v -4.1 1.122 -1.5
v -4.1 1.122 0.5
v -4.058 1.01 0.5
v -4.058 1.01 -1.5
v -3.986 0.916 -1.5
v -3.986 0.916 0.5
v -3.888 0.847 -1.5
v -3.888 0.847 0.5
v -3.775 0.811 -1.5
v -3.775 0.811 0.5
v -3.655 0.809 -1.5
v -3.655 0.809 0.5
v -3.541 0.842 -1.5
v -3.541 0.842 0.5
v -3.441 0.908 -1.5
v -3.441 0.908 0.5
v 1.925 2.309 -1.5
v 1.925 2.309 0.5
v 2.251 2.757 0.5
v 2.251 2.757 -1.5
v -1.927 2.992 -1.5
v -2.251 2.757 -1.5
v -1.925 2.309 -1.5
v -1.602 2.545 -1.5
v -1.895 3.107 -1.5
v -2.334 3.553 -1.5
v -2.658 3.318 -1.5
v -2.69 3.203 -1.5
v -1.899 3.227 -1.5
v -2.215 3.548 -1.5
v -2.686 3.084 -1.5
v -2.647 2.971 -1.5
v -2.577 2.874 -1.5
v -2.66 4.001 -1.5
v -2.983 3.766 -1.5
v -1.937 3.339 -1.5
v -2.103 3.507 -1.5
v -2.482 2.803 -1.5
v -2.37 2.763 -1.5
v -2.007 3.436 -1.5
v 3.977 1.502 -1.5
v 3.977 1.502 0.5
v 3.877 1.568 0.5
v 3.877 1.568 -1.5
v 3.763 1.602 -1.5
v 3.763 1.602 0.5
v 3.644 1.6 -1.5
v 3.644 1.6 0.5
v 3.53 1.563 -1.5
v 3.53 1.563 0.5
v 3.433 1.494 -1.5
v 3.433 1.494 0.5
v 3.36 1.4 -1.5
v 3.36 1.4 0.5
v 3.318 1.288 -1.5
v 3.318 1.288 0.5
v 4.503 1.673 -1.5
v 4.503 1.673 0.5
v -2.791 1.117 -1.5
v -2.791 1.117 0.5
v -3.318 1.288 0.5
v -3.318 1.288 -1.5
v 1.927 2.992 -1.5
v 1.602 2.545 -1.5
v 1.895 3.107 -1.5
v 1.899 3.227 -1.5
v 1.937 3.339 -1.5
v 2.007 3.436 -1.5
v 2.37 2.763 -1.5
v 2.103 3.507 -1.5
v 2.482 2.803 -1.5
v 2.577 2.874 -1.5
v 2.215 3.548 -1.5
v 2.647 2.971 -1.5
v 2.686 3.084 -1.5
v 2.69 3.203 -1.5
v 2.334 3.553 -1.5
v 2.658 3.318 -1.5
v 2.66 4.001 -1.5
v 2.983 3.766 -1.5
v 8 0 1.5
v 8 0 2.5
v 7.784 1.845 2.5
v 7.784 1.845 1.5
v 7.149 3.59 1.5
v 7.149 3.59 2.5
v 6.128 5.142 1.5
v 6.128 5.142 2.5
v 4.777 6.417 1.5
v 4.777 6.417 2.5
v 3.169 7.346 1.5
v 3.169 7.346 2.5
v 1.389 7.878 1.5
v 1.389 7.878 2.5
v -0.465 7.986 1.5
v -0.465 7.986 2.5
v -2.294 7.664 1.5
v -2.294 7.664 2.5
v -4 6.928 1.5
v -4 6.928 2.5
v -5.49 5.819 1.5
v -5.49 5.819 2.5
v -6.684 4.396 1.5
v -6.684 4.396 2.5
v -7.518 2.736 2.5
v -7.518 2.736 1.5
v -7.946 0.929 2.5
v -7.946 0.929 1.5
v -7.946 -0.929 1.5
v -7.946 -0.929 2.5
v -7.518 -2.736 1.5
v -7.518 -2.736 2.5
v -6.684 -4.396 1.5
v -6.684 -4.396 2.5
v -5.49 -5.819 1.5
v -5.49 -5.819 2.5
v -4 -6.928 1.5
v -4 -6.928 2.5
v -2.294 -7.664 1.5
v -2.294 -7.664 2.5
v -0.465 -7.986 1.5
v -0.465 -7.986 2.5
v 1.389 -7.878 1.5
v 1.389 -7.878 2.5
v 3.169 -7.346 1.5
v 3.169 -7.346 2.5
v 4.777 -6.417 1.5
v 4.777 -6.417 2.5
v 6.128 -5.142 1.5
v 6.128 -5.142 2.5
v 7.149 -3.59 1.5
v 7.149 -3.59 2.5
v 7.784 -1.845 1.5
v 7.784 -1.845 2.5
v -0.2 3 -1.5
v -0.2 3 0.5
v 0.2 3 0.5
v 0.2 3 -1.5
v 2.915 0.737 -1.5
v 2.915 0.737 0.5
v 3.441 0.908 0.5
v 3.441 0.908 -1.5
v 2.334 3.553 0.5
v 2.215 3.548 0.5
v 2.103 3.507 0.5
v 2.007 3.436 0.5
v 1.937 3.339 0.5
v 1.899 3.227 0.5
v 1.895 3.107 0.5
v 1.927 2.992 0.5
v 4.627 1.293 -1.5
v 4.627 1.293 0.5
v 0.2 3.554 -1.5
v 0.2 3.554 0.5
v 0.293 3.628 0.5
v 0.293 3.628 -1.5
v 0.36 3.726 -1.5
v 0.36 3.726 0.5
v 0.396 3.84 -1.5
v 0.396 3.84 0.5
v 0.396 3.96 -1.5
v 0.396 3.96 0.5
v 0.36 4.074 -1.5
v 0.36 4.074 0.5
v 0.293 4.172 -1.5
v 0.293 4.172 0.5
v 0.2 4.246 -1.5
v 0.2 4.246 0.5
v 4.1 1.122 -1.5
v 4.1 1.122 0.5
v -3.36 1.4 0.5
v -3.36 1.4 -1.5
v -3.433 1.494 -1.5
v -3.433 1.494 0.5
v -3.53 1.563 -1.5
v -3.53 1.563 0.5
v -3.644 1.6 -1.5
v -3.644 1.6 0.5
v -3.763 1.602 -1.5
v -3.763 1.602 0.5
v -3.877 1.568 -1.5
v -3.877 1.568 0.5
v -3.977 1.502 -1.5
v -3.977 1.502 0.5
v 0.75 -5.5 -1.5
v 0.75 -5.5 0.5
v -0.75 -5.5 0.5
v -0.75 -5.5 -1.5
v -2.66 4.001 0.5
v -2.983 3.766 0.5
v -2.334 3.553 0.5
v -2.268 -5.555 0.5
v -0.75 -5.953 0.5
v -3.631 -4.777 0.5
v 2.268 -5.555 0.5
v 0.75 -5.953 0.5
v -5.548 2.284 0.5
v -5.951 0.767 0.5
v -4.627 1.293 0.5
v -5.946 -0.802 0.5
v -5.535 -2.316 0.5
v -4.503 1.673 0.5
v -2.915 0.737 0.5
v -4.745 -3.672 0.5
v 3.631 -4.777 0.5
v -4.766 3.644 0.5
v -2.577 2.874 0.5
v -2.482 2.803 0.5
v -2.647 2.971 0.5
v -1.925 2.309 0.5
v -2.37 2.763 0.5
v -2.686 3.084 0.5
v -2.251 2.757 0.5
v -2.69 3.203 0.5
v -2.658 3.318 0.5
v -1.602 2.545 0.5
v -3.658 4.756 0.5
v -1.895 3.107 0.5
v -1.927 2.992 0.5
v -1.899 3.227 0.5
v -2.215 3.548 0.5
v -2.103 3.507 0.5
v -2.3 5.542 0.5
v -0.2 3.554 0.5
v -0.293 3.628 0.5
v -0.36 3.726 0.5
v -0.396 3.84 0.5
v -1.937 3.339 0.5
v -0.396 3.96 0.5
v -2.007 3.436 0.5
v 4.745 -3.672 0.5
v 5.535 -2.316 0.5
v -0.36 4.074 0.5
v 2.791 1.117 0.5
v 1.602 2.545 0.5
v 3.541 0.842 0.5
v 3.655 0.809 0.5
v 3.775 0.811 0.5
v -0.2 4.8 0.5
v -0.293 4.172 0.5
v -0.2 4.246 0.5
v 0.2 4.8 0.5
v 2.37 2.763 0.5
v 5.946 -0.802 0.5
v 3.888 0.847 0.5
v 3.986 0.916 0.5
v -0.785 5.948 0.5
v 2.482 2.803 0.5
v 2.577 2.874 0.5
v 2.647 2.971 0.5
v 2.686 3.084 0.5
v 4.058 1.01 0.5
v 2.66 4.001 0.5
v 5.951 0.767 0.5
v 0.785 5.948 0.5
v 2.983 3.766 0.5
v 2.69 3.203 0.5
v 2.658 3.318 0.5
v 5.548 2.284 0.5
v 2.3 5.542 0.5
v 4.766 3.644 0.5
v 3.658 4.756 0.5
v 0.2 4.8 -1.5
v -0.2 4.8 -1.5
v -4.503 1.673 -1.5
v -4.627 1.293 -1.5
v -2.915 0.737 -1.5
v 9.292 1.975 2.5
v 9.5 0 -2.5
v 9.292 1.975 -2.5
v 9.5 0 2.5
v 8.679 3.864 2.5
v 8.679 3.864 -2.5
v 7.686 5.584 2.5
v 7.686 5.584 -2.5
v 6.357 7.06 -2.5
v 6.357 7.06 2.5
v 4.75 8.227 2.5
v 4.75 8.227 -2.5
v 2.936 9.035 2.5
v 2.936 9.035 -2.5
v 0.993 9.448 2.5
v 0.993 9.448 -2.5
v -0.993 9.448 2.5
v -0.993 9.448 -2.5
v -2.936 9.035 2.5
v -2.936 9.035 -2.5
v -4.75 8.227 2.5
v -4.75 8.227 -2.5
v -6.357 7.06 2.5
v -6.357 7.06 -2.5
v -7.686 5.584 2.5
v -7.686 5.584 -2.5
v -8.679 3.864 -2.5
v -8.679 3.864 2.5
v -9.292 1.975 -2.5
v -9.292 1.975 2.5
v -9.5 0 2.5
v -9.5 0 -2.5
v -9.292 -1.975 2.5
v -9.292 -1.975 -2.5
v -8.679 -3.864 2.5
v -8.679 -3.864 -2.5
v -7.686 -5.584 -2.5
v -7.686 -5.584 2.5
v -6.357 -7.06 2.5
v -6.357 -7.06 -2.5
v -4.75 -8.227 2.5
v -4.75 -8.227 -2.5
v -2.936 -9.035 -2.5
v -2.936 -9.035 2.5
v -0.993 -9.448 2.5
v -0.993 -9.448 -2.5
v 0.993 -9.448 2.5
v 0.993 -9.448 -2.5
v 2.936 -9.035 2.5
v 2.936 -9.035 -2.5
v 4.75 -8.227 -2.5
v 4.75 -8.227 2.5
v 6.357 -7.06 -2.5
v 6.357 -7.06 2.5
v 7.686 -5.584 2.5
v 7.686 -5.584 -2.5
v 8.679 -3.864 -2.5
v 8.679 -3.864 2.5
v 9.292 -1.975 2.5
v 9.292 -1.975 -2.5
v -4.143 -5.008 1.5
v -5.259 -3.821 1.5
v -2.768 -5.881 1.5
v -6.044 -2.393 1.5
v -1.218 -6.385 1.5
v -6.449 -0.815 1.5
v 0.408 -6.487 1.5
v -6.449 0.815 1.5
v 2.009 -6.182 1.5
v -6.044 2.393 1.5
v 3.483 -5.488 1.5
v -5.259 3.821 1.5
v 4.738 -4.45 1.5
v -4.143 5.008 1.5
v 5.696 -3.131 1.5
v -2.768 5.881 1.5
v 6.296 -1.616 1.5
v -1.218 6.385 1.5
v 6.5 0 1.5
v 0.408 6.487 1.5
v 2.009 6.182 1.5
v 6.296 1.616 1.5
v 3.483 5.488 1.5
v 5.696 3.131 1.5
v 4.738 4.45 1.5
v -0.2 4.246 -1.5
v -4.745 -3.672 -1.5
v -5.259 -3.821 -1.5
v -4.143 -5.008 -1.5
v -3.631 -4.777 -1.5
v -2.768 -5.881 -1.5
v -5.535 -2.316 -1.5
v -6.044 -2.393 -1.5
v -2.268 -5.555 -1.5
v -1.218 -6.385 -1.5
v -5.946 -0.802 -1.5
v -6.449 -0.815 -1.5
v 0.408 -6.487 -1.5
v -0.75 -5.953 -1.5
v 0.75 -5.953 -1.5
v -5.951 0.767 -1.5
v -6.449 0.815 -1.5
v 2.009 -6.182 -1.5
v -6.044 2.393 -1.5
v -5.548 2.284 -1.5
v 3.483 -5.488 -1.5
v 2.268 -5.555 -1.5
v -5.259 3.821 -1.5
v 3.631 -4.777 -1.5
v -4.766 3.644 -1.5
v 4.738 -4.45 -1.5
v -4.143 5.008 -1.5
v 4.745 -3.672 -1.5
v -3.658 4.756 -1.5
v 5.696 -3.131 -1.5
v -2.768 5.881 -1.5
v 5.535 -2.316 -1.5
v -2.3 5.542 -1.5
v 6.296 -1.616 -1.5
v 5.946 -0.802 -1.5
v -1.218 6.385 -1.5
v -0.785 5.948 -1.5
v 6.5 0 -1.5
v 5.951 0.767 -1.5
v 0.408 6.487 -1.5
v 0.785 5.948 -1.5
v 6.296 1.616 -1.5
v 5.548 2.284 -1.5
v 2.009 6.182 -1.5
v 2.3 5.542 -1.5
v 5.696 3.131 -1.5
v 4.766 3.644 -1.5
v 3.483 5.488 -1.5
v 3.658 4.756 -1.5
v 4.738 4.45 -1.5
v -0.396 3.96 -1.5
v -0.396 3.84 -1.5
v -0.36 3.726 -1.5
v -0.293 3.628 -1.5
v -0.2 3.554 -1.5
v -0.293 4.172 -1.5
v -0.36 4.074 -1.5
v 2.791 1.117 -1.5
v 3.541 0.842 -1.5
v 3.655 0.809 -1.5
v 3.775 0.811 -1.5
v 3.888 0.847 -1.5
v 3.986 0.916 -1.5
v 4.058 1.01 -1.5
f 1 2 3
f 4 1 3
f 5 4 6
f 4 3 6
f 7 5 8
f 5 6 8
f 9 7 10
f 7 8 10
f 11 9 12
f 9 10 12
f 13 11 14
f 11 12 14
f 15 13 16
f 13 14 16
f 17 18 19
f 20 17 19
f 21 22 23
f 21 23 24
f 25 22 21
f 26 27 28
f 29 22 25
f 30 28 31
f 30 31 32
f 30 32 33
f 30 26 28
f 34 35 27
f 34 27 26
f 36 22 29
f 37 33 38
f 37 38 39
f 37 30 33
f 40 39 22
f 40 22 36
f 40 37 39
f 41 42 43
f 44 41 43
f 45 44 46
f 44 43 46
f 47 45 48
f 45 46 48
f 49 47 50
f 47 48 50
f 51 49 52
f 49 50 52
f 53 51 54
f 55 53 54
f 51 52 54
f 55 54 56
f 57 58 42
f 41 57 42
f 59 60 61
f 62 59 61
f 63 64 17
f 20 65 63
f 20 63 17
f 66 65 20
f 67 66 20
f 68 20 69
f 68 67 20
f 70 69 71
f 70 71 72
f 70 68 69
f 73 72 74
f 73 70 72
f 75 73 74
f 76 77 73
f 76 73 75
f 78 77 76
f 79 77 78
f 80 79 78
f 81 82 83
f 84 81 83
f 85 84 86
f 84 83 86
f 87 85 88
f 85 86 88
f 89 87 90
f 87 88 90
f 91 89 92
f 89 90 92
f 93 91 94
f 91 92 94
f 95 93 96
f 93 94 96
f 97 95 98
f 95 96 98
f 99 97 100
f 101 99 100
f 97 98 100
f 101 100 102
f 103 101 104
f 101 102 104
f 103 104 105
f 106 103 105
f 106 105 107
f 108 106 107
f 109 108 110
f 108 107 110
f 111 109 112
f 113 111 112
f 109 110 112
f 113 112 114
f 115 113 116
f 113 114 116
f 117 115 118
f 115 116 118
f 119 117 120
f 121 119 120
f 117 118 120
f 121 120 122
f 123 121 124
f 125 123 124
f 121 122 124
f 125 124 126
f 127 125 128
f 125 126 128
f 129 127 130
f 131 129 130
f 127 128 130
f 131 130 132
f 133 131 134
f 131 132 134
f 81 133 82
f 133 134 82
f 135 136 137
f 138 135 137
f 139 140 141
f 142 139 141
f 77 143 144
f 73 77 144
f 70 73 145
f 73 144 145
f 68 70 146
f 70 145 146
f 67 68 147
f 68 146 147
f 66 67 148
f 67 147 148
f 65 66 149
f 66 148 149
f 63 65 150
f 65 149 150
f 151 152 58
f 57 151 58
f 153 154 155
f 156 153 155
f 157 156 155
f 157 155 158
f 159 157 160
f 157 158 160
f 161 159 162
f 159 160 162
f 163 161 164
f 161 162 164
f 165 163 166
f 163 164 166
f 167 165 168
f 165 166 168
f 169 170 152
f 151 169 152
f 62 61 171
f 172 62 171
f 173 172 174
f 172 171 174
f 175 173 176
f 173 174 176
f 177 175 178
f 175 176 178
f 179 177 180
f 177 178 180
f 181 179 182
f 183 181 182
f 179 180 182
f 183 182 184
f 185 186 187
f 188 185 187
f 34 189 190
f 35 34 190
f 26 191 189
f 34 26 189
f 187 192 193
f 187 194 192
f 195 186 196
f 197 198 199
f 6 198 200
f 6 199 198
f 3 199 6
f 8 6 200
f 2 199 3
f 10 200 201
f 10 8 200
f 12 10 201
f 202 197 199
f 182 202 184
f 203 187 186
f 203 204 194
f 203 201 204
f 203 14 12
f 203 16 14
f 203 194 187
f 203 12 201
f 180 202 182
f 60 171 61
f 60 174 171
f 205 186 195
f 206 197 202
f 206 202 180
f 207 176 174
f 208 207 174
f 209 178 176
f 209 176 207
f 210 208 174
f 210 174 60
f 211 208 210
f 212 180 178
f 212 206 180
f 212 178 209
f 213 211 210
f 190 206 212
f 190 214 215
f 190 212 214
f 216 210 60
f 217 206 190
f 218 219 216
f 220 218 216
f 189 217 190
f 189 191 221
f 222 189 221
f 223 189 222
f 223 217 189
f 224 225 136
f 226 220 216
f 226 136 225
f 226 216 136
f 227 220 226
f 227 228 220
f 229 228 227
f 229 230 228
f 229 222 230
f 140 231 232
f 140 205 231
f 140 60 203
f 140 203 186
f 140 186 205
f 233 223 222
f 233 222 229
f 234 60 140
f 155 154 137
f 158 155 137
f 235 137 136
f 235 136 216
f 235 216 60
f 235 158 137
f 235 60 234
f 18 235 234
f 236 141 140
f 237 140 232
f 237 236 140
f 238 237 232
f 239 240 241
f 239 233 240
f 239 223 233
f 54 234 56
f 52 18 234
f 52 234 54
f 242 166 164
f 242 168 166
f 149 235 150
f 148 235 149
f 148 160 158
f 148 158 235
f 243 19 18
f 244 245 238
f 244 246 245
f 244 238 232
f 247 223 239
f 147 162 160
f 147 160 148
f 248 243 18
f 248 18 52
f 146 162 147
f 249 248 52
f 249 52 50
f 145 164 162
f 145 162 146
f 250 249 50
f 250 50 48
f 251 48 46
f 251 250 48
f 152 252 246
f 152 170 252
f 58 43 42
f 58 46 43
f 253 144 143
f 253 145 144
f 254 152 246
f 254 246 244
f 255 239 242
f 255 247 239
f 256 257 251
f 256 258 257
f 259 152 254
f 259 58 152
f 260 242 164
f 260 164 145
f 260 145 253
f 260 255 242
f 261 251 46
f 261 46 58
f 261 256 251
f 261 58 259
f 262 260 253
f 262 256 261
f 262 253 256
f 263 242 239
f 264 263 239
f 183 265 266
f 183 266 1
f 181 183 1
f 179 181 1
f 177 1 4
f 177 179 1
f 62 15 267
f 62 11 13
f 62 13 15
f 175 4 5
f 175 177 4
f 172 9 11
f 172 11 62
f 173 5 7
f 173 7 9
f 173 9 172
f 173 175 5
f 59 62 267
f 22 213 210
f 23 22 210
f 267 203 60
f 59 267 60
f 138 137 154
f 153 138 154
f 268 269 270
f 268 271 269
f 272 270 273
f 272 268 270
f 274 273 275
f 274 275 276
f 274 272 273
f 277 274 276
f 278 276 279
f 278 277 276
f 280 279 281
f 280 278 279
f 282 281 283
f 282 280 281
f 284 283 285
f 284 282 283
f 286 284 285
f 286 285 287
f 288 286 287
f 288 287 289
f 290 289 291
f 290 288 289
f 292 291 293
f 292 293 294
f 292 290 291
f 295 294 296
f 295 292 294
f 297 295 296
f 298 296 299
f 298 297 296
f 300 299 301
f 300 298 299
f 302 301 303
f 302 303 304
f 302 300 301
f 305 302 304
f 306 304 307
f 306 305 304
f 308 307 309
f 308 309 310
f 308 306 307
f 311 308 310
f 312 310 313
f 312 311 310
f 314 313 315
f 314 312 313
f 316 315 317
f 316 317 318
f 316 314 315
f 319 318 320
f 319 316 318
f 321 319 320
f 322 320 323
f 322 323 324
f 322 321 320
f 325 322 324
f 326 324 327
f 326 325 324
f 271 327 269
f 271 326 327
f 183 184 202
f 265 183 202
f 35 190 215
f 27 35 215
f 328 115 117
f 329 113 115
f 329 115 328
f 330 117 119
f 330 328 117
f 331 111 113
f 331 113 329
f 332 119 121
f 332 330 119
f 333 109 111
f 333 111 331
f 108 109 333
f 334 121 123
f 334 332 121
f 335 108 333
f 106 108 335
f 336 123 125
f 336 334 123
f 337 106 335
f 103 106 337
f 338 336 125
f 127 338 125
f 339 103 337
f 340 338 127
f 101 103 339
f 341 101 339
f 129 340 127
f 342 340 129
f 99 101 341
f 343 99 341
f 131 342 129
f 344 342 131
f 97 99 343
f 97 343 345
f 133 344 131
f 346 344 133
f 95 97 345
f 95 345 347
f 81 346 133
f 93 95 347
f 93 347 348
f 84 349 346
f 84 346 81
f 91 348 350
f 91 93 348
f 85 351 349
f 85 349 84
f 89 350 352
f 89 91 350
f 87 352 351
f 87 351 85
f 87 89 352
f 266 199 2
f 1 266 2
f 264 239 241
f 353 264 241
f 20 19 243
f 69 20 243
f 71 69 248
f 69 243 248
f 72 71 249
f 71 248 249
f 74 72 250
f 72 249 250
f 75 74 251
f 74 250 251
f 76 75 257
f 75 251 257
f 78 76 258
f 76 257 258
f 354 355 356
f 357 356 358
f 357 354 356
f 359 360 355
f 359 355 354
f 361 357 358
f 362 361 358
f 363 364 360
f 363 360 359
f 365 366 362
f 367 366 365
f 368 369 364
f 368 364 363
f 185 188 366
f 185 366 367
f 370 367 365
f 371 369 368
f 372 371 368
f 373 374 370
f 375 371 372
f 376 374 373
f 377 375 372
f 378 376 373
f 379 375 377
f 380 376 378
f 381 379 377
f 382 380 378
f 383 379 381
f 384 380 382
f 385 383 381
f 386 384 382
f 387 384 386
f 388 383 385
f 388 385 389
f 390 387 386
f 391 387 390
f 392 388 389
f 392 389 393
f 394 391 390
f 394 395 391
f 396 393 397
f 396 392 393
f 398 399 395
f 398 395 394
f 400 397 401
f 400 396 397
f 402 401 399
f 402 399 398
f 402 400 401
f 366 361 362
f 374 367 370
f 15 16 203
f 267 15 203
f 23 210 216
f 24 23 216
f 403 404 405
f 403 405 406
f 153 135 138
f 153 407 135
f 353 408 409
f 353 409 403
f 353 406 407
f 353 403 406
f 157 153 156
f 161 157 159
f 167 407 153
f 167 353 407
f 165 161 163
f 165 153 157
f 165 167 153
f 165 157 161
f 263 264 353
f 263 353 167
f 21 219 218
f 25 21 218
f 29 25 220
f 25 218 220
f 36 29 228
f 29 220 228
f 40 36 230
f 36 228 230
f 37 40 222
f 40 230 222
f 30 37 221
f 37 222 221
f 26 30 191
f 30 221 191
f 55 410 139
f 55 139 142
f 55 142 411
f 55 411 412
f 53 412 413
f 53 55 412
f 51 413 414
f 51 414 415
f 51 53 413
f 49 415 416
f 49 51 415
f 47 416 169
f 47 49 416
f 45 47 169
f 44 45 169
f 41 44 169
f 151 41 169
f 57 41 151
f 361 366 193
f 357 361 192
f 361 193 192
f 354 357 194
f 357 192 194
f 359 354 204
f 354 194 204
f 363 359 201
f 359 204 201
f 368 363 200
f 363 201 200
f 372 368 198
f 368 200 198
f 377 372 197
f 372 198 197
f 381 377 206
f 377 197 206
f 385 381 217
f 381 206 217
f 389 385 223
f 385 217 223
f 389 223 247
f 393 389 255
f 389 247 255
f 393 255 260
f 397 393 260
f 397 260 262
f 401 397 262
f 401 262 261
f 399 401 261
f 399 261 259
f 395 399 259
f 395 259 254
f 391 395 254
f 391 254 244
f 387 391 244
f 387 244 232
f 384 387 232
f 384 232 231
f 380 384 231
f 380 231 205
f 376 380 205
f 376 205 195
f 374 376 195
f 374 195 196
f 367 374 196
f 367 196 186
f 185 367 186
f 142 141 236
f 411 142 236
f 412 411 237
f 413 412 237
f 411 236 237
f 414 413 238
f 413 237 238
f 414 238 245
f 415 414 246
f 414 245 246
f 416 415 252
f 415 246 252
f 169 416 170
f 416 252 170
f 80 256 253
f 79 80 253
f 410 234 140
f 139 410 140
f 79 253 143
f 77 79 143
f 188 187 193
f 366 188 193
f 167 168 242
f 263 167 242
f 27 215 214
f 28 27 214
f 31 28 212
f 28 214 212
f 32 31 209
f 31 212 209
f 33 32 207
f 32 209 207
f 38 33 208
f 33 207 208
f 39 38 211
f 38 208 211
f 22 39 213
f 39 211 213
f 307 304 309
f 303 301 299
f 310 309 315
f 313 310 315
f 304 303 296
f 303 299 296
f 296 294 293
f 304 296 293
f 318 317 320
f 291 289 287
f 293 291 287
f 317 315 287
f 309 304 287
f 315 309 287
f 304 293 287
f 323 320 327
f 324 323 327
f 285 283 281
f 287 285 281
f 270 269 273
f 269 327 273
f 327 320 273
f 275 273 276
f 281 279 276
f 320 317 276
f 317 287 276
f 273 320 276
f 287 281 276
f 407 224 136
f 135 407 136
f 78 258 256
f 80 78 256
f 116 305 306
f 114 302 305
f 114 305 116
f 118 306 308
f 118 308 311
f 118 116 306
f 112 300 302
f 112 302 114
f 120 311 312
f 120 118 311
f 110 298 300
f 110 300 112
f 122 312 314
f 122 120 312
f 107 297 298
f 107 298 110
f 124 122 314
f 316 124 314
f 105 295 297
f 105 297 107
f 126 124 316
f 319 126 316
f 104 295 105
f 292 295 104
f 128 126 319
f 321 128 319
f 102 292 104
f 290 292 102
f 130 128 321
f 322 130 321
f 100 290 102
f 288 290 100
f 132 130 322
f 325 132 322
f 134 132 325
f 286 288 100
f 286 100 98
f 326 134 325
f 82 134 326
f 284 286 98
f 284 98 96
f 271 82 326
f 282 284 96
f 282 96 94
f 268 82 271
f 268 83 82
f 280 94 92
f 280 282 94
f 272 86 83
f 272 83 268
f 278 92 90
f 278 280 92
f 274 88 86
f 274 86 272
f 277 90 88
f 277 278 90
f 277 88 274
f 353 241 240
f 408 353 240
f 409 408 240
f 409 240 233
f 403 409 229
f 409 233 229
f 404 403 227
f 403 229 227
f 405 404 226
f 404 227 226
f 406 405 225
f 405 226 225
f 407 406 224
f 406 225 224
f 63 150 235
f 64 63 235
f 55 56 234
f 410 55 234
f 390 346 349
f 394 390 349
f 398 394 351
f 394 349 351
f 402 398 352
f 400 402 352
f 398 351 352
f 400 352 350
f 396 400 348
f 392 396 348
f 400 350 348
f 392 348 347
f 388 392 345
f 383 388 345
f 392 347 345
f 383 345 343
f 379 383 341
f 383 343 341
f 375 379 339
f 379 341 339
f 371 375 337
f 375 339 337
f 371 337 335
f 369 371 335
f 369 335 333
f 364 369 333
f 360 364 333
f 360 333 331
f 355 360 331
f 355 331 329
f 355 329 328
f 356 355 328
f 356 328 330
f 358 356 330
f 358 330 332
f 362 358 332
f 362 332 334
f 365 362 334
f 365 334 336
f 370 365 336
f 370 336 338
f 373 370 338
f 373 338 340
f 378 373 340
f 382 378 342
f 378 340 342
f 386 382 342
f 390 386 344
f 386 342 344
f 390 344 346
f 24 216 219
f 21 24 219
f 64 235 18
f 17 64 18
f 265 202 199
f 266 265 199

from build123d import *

# Parameters (mm, degrees)
F0_R     = 9.5
F1_DEPTH = 2.5
F2_R     = 6.5
F3_DEPTH = 4
F4_R     = 6
F5_DEPTH = 2
F6_R     = 8
F7_DEPTH = 1


with BuildPart() as f1:
    # F0 (on Top) → F1 (new body, symmetric)
    with BuildSketch(Plane.XY):
        Circle(F0_R)
    extrude(amount=F1_DEPTH, both=True)

    # F2 (on face) → F3 (cut)
    with BuildSketch(Plane.XY.offset(2.5)):
        Circle(F2_R)
        with BuildLine():
            ThreePointArc((-0.75, -5.95294), (0, 6), (0.75, -5.95294))
            Line((0.75, -5.95294), (0.75, -5.5))
            Line((0.75, -5.5), (-0.75, -5.5))
            Line((-0.75, -5.5), (-0.75, -5.95294))
        make_face(mode=Mode.SUBTRACT)
        with BuildLine():
            Line((-3.441468, 0.907908), (-2.914973, 0.73684))
            Line((-2.914973, 0.73684), (-2.791366, 1.117262))
            Line((-2.791366, 1.117262), (-3.317861, 1.288331))
            ThreePointArc((-3.317861, 1.288331), (-3.585514, 1.585589), (-3.976773, 1.502424))
            Line((-3.976773, 1.502424), (-4.503268, 1.673493))
            Line((-4.503268, 1.673493), (-4.626875, 1.29307))
            Line((-4.626875, 1.29307), (-4.100379, 1.122002))
            ThreePointArc((-4.100379, 1.122002), (-3.832727, 0.824744), (-3.441468, 0.907908))
        make_face()
        with BuildLine():
            Line((-2.250551, 2.757358), (-1.925159, 2.309494))
            Line((-1.925159, 2.309494), (-1.601552, 2.544608))
            Line((-1.601552, 2.544608), (-1.926944, 2.992472))
            ThreePointArc((-1.926944, 2.992472), (-1.968756, 3.39028), (-2.334174, 3.552975))
            Line((-2.334174, 3.552975), (-2.659566, 4.000839))
            Line((-2.659566, 4.000839), (-2.983173, 3.765725))
            Line((-2.983173, 3.765725), (-2.657781, 3.317861))
            ThreePointArc((-2.657781, 3.317861), (-2.615969, 2.920052), (-2.250551, 2.757358))
        make_face()
        with BuildLine():
            Line((-0.2, 3), (0.2, 3))
            Line((0.2, 3), (0.2, 3.55359))
            ThreePointArc((0.2, 3.55359), (0.4, 3.9), (0.2, 4.24641))
            Line((0.2, 4.24641), (0.2, 4.8))
            Line((0.2, 4.8), (-0.2, 4.8))
            Line((-0.2, 4.8), (-0.2, 4.24641))
            ThreePointArc((-0.2, 4.24641), (-0.4, 3.9), (-0.2, 3.55359))
            Line((-0.2, 3.55359), (-0.2, 3))
        make_face()
        with BuildLine():
            Line((1.926944, 2.992472), (1.601552, 2.544608))
            Line((1.601552, 2.544608), (1.925159, 2.309494))
            Line((1.925159, 2.309494), (2.250551, 2.757358))
            ThreePointArc((2.250551, 2.757358), (2.615969, 2.920052), (2.657781, 3.317861))
            Line((2.657781, 3.317861), (2.983173, 3.765725))
            Line((2.983173, 3.765725), (2.659566, 4.000839))
            Line((2.659566, 4.000839), (2.334174, 3.552975))
            ThreePointArc((2.334174, 3.552975), (1.968756, 3.39028), (1.926944, 2.992472))
        make_face()
        with BuildLine():
            Line((3.317861, 1.288331), (2.791366, 1.117262))
            Line((2.791366, 1.117262), (2.914973, 0.73684))
            Line((2.914973, 0.73684), (3.441468, 0.907908))
            ThreePointArc((3.441468, 0.907908), (3.832727, 0.824744), (4.100379, 1.122002))
            Line((4.100379, 1.122002), (4.626875, 1.29307))
            Line((4.626875, 1.29307), (4.503268, 1.673493))
            Line((4.503268, 1.673493), (3.976773, 1.502424))
            ThreePointArc((3.976773, 1.502424), (3.585514, 1.585589), (3.317861, 1.288331))
        make_face()
    extrude(amount=-F3_DEPTH, mode=Mode.SUBTRACT)

    # F4 (on face) → F5 (cut)
    with BuildSketch(Plane.XY.offset(2.5)):
        Circle(F4_R)
    extrude(amount=-F5_DEPTH, mode=Mode.SUBTRACT)

    # F6 (on face) → F7 (cut)
    with BuildSketch(Plane.XY.offset(2.5)):
        Circle(F6_R)
    extrude(amount=-F7_DEPTH, mode=Mode.SUBTRACT)


solid = f1.part
